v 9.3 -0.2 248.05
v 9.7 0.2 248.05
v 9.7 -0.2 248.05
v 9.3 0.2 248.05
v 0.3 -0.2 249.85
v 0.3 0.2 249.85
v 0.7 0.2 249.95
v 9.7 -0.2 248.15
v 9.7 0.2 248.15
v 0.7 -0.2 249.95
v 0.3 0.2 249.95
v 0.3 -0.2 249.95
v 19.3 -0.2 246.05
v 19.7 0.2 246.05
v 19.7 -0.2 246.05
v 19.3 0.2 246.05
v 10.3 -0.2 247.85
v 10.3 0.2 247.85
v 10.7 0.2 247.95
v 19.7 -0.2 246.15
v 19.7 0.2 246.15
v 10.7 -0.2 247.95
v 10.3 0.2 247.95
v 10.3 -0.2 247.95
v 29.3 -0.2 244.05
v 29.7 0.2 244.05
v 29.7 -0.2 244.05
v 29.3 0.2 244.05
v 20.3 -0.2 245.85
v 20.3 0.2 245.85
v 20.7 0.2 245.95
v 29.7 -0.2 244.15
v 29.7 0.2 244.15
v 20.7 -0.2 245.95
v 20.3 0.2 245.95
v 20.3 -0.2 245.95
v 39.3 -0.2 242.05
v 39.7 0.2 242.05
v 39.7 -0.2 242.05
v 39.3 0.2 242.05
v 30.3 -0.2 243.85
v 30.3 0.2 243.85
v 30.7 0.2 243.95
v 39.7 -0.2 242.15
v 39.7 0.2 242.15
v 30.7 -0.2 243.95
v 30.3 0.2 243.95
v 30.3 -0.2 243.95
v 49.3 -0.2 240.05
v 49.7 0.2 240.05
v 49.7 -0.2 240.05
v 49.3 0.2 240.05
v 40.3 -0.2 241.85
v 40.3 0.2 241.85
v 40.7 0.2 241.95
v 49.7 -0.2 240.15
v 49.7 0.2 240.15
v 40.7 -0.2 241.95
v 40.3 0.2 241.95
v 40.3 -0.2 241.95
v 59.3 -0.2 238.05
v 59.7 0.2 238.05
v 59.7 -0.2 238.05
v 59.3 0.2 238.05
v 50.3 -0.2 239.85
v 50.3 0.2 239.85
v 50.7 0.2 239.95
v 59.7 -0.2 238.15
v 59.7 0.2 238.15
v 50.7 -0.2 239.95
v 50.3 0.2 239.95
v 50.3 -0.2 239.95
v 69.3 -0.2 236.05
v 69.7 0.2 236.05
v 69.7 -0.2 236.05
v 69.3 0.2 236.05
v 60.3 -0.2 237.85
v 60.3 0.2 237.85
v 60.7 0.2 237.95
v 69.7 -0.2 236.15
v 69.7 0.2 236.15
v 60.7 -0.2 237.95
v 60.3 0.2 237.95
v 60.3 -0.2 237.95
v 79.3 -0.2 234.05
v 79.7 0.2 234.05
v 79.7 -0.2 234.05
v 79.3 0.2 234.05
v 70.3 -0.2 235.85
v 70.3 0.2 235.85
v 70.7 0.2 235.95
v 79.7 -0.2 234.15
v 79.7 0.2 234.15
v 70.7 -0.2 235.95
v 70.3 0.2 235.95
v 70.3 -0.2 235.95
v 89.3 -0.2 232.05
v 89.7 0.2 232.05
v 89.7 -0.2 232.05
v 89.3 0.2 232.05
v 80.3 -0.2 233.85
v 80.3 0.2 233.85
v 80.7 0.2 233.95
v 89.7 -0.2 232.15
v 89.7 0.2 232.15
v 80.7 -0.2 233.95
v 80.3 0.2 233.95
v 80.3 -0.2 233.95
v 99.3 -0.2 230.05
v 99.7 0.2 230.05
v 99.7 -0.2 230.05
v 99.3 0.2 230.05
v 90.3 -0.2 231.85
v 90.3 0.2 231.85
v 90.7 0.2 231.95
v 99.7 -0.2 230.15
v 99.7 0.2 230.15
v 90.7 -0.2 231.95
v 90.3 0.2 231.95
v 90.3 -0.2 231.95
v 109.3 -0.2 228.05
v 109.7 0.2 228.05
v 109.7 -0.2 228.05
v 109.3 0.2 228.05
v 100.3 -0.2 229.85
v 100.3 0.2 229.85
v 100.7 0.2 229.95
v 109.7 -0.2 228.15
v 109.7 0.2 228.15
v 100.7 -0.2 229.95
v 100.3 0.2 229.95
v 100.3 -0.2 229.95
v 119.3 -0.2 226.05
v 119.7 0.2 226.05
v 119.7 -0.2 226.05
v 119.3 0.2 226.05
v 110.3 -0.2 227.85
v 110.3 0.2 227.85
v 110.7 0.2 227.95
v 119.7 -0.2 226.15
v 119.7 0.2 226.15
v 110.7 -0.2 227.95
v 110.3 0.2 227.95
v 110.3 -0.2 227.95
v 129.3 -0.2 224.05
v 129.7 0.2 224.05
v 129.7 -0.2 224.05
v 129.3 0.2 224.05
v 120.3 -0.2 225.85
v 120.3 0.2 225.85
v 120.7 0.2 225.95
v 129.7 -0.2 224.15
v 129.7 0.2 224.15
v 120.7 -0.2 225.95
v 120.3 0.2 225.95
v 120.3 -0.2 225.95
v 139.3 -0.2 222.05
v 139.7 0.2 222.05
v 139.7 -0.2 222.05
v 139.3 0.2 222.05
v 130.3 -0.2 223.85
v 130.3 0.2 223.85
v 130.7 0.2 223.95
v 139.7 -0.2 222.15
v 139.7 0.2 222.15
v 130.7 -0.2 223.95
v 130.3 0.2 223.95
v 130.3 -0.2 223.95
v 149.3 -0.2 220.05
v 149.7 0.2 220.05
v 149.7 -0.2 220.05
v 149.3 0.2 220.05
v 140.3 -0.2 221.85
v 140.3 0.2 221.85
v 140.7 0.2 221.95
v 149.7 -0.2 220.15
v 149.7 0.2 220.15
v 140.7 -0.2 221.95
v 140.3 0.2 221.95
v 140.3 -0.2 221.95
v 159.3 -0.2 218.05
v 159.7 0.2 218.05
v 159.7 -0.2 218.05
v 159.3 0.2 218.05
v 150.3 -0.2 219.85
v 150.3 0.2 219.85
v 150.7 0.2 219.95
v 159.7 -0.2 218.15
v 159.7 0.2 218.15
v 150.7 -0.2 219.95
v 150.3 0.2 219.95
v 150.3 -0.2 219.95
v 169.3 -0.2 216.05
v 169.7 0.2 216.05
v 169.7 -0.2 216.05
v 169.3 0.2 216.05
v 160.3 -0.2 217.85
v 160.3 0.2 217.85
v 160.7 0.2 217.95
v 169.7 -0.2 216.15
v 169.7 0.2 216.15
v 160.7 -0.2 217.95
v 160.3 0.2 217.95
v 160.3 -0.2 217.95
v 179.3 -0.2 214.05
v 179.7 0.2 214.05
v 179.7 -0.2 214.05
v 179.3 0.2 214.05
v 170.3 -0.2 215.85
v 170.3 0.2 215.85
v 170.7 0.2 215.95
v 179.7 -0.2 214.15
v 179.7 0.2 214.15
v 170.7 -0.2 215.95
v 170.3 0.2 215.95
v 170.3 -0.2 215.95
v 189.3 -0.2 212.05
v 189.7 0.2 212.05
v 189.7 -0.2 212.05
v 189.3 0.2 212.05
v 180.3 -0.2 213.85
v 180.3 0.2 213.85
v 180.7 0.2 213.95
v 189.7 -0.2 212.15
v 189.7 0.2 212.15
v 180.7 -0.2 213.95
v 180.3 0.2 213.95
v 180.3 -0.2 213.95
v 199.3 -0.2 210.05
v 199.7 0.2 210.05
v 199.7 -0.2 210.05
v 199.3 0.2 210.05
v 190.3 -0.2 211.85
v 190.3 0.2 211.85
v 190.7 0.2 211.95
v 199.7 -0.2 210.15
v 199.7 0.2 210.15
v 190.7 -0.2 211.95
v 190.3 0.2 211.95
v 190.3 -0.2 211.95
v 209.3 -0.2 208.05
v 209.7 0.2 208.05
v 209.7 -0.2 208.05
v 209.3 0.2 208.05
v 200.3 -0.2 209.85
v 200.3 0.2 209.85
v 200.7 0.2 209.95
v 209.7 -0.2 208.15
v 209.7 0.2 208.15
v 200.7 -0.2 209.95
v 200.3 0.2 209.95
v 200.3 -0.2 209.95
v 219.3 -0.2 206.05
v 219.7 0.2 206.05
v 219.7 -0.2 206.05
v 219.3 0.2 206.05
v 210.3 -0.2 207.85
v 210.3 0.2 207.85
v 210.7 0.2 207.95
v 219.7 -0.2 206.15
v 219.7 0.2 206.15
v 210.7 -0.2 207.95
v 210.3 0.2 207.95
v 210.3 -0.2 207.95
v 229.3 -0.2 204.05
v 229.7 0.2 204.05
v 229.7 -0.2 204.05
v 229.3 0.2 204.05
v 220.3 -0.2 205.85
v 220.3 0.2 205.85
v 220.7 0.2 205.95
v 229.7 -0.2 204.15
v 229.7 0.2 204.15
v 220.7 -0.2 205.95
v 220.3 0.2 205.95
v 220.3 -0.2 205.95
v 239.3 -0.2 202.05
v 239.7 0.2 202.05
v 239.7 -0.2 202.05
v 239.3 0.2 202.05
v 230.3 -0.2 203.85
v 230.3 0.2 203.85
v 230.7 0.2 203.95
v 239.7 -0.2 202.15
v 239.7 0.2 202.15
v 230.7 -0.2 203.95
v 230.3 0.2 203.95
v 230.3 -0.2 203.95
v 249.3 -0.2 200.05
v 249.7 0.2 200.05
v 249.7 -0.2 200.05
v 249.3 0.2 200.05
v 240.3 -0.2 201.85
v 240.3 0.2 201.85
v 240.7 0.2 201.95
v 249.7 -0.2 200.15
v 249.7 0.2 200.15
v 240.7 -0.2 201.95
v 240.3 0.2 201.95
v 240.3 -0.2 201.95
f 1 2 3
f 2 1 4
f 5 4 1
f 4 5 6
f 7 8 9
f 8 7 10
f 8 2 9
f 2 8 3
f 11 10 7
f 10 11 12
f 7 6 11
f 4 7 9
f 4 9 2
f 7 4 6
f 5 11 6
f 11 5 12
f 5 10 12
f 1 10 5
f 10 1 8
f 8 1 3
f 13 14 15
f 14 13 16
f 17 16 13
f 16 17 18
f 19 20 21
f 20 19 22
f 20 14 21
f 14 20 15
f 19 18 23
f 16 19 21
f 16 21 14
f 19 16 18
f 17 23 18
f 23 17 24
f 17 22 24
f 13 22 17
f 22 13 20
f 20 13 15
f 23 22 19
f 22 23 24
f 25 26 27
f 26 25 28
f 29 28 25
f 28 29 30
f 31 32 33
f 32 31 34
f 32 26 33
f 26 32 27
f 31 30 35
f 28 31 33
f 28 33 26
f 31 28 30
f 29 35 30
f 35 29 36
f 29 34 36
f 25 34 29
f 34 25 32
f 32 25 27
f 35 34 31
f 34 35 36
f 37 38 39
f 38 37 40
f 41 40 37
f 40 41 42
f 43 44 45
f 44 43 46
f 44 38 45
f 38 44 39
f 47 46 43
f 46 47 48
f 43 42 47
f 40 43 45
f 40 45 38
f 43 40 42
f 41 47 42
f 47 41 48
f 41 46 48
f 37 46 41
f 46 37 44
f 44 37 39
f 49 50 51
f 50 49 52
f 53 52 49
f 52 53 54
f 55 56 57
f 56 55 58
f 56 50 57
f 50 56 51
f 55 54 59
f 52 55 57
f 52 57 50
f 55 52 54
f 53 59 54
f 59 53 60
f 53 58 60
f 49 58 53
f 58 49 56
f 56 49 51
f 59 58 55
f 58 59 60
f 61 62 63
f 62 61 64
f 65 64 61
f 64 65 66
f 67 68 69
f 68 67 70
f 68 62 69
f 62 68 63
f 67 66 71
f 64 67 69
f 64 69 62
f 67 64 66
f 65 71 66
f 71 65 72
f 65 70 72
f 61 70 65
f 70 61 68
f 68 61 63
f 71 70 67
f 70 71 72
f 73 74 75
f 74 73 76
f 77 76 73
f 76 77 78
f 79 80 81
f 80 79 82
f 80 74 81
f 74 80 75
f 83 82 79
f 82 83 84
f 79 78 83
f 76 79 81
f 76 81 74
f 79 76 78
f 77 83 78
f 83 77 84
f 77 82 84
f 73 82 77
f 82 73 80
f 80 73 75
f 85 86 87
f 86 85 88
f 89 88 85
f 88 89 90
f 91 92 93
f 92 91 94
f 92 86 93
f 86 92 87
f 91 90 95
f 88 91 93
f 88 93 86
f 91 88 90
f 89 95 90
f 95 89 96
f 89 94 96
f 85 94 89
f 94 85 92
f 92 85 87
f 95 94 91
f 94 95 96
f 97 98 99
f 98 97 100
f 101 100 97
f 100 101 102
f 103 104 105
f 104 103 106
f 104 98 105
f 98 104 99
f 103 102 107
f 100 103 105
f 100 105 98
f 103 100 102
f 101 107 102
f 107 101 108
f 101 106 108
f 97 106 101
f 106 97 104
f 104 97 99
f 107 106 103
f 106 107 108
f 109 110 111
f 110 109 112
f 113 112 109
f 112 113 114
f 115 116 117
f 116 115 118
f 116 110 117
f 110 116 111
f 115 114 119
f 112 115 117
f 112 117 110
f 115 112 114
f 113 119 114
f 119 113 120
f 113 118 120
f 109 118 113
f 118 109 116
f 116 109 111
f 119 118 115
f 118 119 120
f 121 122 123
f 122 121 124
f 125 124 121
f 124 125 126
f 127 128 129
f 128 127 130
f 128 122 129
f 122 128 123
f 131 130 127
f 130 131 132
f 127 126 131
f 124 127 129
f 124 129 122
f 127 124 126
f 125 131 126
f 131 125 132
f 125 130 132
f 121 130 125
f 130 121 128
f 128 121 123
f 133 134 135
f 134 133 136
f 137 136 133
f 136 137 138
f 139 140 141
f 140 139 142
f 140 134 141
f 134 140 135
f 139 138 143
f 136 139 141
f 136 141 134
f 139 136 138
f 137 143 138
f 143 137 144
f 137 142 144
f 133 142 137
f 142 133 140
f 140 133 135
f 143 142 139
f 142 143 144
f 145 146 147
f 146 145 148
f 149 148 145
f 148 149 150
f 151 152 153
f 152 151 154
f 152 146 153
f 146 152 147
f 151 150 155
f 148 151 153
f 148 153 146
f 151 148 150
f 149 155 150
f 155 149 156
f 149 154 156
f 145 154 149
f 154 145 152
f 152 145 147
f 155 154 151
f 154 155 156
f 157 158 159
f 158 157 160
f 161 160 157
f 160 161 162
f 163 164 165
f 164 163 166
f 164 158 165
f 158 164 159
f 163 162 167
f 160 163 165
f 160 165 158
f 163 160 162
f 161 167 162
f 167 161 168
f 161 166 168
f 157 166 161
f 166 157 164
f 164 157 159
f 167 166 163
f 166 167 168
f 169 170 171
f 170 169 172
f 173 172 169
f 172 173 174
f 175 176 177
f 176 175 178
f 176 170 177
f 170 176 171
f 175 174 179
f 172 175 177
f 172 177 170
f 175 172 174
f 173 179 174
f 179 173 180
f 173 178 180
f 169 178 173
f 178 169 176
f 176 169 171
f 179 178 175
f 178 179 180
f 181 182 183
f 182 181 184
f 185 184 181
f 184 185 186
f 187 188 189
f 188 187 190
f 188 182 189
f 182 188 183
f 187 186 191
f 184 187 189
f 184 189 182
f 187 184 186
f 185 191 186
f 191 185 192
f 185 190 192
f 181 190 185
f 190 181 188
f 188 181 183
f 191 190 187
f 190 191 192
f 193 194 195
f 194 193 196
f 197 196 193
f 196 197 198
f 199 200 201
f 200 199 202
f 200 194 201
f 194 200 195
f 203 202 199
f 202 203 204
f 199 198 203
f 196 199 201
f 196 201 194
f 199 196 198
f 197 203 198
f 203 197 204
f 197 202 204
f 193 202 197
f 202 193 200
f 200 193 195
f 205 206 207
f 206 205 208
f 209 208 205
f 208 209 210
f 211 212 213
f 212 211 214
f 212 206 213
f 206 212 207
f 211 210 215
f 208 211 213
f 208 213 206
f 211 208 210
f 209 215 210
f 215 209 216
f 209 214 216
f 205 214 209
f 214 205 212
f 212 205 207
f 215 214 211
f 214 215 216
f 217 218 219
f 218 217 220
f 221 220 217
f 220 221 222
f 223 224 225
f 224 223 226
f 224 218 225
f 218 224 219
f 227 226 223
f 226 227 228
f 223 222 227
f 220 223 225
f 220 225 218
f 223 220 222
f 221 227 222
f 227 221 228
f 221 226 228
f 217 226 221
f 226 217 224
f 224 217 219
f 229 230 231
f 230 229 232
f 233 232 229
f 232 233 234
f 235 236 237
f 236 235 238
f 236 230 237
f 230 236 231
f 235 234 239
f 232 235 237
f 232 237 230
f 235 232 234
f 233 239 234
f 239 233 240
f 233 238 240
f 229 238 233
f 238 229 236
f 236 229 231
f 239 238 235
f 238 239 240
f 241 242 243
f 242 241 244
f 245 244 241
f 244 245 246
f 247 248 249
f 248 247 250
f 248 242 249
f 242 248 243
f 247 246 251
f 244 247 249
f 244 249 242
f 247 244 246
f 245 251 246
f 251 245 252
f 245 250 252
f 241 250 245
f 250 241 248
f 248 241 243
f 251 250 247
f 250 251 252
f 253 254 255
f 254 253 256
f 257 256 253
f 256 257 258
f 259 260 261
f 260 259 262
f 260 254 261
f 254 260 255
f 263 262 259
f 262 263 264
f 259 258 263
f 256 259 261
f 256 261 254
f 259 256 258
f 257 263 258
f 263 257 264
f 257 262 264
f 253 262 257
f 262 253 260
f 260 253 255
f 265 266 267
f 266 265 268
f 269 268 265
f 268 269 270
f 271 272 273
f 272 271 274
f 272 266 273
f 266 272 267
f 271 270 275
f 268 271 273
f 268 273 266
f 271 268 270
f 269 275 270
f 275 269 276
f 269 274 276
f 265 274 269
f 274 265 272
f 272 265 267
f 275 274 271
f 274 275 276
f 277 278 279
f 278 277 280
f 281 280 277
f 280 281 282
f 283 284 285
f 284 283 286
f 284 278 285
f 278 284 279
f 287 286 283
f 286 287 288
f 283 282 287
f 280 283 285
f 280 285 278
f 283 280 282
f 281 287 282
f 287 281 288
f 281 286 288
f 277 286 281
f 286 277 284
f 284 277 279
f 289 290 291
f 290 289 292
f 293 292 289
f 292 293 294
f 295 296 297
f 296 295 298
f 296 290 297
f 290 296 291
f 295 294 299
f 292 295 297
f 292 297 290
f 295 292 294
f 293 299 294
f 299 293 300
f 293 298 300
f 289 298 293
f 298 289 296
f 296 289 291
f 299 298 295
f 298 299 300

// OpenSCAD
hull() {
    translate([0.5, 0.0, 249.9]) cube([0.4, 0.4, 0.1], center=true);
    translate([9.5, 0.0, 248.10000000000002]) cube([0.4, 0.4, 0.1], center=true);
}


hull() {
    translate([10.5, 0.0, 247.90000000000003]) cube([0.4, 0.4, 0.1], center=true);
    translate([19.5, 0.0, 246.10000000000002]) cube([0.4, 0.4, 0.1], center=true);
}


hull() {
    translate([20.5, 0.0, 245.9]) cube([0.4, 0.4, 0.1], center=true);
    translate([29.5, 0.0, 244.1]) cube([0.4, 0.4, 0.1], center=true);
}


hull() {
    translate([30.5, 0.0, 243.9]) cube([0.4, 0.4, 0.1], center=true);
    translate([39.5, 0.0, 242.10000000000002]) cube([0.4, 0.4, 0.1], center=true);
}


hull() {
    translate([40.5, 0.0, 241.9]) cube([0.4, 0.4, 0.1], center=true);
    translate([49.5, 0.0, 240.1]) cube([0.4, 0.4, 0.1], center=true);
}


hull() {
    translate([50.5, 0.0, 239.9]) cube([0.4, 0.4, 0.1], center=true);
    translate([59.5, 0.0, 238.10000000000002]) cube([0.4, 0.4, 0.1], center=true);
}


hull() {
    translate([60.5, 0.0, 237.90000000000003]) cube([0.4, 0.4, 0.1], center=true);
    translate([69.5, 0.0, 236.10000000000002]) cube([0.4, 0.4, 0.1], center=true);
}


hull() {
    translate([70.5, 0.0, 235.9]) cube([0.4, 0.4, 0.1], center=true);
    translate([79.5, 0.0, 234.1]) cube([0.4, 0.4, 0.1], center=true);
}


hull() {
    translate([80.5, 0.0, 233.9]) cube([0.4, 0.4, 0.1], center=true);
    translate([89.5, 0.0, 232.10000000000002]) cube([0.4, 0.4, 0.1], center=true);
}


hull() {
    translate([90.5, 0.0, 231.9]) cube([0.4, 0.4, 0.1], center=true);
    translate([99.5, 0.0, 230.1]) cube([0.4, 0.4, 0.1], center=true);
}


hull() {
    translate([100.5, 0.0, 229.9]) cube([0.4, 0.4, 0.1], center=true);
    translate([109.5, 0.0, 228.10000000000002]) cube([0.4, 0.4, 0.1], center=true);
}


hull() {
    translate([110.5, 0.0, 227.90000000000003]) cube([0.4, 0.4, 0.1], center=true);
    translate([119.5, 0.0, 226.10000000000002]) cube([0.4, 0.4, 0.1], center=true);
}


hull() {
    translate([120.5, 0.0, 225.9]) cube([0.4, 0.4, 0.1], center=true);
    translate([129.5, 0.0, 224.1]) cube([0.4, 0.4, 0.1], center=true);
}


hull() {
    translate([130.5, 0.0, 223.9]) cube([0.4, 0.4, 0.1], center=true);
    translate([139.5, 0.0, 222.10000000000002]) cube([0.4, 0.4, 0.1], center=true);
}


hull() {
    translate([140.5, 0.0, 221.9]) cube([0.4, 0.4, 0.1], center=true);
    translate([149.5, 0.0, 220.1]) cube([0.4, 0.4, 0.1], center=true);
}


hull() {
    translate([150.5, 0.0, 219.9]) cube([0.4, 0.4, 0.1], center=true);
    translate([159.5, 0.0, 218.10000000000002]) cube([0.4, 0.4, 0.1], center=true);
}


hull() {
    translate([160.5, 0.0, 217.90000000000003]) cube([0.4, 0.4, 0.1], center=true);
    translate([169.5, 0.0, 216.10000000000002]) cube([0.4, 0.4, 0.1], center=true);
}


hull() {
    translate([170.5, 0.0, 215.9]) cube([0.4, 0.4, 0.1], center=true);
    translate([179.5, 0.0, 214.1]) cube([0.4, 0.4, 0.1], center=true);
}


hull() {
    translate([180.5, 0.0, 213.9]) cube([0.4, 0.4, 0.1], center=true);
    translate([189.5, 0.0, 212.10000000000002]) cube([0.4, 0.4, 0.1], center=true);
}


hull() {
    translate([190.5, 0.0, 211.9]) cube([0.4, 0.4, 0.1], center=true);
    translate([199.5, 0.0, 210.1]) cube([0.4, 0.4, 0.1], center=true);
}


hull() {
    translate([200.5, 0.0, 209.9]) cube([0.4, 0.4, 0.1], center=true);
    translate([209.5, 0.0, 208.10000000000002]) cube([0.4, 0.4, 0.1], center=true);
}


hull() {
    translate([210.5, 0.0, 207.90000000000003]) cube([0.4, 0.4, 0.1], center=true);
    translate([219.5, 0.0, 206.10000000000002]) cube([0.4, 0.4, 0.1], center=true);
}


hull() {
    translate([220.5, 0.0, 205.9]) cube([0.4, 0.4, 0.1], center=true);
    translate([229.5, 0.0, 204.1]) cube([0.4, 0.4, 0.1], center=true);
}


hull() {
    translate([230.5, 0.0, 203.9]) cube([0.4, 0.4, 0.1], center=true);
    translate([239.5, 0.0, 202.10000000000002]) cube([0.4, 0.4, 0.1], center=true);
}


hull() {
    translate([240.5, 0.0, 201.9]) cube([0.4, 0.4, 0.1], center=true);
    translate([249.5, 0.0, 200.1]) cube([0.4, 0.4, 0.1], center=true);
}
